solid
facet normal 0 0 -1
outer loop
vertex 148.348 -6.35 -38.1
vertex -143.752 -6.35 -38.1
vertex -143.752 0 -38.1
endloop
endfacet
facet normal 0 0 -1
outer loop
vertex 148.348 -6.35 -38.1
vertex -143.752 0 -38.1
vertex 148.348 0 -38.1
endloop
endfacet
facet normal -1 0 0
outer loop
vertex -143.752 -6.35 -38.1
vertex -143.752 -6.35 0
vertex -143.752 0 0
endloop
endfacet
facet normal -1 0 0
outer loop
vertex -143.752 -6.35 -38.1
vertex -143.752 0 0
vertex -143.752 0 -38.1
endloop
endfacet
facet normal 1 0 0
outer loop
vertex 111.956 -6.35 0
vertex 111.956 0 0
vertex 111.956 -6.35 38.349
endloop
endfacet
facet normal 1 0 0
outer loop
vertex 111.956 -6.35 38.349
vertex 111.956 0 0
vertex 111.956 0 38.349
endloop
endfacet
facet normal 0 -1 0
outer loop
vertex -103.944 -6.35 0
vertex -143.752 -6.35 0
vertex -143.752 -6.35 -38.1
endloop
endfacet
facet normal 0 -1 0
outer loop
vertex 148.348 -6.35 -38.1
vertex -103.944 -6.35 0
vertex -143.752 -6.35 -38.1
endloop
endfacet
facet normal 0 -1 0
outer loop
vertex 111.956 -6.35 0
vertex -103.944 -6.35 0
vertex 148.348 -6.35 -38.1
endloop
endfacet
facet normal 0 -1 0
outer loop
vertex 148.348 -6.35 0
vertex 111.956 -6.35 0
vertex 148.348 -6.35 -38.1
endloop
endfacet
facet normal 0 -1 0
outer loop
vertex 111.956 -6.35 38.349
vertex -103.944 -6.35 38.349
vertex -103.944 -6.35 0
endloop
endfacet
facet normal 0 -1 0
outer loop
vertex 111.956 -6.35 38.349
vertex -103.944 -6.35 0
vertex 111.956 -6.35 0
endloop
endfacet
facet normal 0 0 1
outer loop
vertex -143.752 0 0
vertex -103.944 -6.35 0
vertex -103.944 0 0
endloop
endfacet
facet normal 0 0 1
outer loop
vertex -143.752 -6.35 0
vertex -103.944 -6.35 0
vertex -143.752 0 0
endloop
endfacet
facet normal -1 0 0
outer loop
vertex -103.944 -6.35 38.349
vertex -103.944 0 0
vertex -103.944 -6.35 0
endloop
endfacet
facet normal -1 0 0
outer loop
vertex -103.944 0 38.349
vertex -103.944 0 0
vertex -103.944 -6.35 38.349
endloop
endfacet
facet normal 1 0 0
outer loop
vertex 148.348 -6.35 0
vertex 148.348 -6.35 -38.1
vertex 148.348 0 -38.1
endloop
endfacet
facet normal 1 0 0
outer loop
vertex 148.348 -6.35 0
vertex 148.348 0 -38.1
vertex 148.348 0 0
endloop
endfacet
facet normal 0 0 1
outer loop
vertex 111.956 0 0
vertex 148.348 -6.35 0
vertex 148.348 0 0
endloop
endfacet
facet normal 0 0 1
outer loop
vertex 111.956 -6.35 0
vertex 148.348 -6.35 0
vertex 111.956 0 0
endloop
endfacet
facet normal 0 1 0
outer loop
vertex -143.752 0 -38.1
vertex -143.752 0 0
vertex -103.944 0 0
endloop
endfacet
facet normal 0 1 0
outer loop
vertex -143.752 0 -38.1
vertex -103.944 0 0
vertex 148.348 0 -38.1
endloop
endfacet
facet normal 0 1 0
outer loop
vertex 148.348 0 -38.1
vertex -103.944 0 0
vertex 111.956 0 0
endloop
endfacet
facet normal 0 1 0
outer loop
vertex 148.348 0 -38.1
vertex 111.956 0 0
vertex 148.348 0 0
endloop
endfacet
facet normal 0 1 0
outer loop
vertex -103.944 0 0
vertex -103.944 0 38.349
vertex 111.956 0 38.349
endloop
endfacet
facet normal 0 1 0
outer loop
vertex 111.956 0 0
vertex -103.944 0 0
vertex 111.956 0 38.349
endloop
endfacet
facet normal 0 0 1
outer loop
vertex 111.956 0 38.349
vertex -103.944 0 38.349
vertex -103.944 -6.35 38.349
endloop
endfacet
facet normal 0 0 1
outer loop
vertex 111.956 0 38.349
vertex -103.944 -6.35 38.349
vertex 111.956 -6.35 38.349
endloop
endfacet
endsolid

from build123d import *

# Parameters (mm, degrees)
F0_W     = 215.9
F0_H     = 76.2
F1_DEPTH = 6.35
F3_DEPTH = 6.35


with BuildPart() as f1:
    # F0 (on Front) → F1 (new body)
    with BuildSketch(Plane.XZ):
        with Locations((4.005505, 0.249261)):
            Rectangle(F0_W, F0_H)
    extrude(amount=F1_DEPTH)

    # F2 (on face) → F3 (join)
    with BuildSketch(Plane.XZ.offset(6.35)):
        Polygon((-103.944495, 0), (-143.752261, 0), (-143.752261, -38.1), (148.347739, -38.1), (148.347739, 0), (111.955505, 0), (111.955505, -37.850739), (-103.944495, -37.850739), align=None)
    extrude(amount=-F3_DEPTH)


solid = f1.part
